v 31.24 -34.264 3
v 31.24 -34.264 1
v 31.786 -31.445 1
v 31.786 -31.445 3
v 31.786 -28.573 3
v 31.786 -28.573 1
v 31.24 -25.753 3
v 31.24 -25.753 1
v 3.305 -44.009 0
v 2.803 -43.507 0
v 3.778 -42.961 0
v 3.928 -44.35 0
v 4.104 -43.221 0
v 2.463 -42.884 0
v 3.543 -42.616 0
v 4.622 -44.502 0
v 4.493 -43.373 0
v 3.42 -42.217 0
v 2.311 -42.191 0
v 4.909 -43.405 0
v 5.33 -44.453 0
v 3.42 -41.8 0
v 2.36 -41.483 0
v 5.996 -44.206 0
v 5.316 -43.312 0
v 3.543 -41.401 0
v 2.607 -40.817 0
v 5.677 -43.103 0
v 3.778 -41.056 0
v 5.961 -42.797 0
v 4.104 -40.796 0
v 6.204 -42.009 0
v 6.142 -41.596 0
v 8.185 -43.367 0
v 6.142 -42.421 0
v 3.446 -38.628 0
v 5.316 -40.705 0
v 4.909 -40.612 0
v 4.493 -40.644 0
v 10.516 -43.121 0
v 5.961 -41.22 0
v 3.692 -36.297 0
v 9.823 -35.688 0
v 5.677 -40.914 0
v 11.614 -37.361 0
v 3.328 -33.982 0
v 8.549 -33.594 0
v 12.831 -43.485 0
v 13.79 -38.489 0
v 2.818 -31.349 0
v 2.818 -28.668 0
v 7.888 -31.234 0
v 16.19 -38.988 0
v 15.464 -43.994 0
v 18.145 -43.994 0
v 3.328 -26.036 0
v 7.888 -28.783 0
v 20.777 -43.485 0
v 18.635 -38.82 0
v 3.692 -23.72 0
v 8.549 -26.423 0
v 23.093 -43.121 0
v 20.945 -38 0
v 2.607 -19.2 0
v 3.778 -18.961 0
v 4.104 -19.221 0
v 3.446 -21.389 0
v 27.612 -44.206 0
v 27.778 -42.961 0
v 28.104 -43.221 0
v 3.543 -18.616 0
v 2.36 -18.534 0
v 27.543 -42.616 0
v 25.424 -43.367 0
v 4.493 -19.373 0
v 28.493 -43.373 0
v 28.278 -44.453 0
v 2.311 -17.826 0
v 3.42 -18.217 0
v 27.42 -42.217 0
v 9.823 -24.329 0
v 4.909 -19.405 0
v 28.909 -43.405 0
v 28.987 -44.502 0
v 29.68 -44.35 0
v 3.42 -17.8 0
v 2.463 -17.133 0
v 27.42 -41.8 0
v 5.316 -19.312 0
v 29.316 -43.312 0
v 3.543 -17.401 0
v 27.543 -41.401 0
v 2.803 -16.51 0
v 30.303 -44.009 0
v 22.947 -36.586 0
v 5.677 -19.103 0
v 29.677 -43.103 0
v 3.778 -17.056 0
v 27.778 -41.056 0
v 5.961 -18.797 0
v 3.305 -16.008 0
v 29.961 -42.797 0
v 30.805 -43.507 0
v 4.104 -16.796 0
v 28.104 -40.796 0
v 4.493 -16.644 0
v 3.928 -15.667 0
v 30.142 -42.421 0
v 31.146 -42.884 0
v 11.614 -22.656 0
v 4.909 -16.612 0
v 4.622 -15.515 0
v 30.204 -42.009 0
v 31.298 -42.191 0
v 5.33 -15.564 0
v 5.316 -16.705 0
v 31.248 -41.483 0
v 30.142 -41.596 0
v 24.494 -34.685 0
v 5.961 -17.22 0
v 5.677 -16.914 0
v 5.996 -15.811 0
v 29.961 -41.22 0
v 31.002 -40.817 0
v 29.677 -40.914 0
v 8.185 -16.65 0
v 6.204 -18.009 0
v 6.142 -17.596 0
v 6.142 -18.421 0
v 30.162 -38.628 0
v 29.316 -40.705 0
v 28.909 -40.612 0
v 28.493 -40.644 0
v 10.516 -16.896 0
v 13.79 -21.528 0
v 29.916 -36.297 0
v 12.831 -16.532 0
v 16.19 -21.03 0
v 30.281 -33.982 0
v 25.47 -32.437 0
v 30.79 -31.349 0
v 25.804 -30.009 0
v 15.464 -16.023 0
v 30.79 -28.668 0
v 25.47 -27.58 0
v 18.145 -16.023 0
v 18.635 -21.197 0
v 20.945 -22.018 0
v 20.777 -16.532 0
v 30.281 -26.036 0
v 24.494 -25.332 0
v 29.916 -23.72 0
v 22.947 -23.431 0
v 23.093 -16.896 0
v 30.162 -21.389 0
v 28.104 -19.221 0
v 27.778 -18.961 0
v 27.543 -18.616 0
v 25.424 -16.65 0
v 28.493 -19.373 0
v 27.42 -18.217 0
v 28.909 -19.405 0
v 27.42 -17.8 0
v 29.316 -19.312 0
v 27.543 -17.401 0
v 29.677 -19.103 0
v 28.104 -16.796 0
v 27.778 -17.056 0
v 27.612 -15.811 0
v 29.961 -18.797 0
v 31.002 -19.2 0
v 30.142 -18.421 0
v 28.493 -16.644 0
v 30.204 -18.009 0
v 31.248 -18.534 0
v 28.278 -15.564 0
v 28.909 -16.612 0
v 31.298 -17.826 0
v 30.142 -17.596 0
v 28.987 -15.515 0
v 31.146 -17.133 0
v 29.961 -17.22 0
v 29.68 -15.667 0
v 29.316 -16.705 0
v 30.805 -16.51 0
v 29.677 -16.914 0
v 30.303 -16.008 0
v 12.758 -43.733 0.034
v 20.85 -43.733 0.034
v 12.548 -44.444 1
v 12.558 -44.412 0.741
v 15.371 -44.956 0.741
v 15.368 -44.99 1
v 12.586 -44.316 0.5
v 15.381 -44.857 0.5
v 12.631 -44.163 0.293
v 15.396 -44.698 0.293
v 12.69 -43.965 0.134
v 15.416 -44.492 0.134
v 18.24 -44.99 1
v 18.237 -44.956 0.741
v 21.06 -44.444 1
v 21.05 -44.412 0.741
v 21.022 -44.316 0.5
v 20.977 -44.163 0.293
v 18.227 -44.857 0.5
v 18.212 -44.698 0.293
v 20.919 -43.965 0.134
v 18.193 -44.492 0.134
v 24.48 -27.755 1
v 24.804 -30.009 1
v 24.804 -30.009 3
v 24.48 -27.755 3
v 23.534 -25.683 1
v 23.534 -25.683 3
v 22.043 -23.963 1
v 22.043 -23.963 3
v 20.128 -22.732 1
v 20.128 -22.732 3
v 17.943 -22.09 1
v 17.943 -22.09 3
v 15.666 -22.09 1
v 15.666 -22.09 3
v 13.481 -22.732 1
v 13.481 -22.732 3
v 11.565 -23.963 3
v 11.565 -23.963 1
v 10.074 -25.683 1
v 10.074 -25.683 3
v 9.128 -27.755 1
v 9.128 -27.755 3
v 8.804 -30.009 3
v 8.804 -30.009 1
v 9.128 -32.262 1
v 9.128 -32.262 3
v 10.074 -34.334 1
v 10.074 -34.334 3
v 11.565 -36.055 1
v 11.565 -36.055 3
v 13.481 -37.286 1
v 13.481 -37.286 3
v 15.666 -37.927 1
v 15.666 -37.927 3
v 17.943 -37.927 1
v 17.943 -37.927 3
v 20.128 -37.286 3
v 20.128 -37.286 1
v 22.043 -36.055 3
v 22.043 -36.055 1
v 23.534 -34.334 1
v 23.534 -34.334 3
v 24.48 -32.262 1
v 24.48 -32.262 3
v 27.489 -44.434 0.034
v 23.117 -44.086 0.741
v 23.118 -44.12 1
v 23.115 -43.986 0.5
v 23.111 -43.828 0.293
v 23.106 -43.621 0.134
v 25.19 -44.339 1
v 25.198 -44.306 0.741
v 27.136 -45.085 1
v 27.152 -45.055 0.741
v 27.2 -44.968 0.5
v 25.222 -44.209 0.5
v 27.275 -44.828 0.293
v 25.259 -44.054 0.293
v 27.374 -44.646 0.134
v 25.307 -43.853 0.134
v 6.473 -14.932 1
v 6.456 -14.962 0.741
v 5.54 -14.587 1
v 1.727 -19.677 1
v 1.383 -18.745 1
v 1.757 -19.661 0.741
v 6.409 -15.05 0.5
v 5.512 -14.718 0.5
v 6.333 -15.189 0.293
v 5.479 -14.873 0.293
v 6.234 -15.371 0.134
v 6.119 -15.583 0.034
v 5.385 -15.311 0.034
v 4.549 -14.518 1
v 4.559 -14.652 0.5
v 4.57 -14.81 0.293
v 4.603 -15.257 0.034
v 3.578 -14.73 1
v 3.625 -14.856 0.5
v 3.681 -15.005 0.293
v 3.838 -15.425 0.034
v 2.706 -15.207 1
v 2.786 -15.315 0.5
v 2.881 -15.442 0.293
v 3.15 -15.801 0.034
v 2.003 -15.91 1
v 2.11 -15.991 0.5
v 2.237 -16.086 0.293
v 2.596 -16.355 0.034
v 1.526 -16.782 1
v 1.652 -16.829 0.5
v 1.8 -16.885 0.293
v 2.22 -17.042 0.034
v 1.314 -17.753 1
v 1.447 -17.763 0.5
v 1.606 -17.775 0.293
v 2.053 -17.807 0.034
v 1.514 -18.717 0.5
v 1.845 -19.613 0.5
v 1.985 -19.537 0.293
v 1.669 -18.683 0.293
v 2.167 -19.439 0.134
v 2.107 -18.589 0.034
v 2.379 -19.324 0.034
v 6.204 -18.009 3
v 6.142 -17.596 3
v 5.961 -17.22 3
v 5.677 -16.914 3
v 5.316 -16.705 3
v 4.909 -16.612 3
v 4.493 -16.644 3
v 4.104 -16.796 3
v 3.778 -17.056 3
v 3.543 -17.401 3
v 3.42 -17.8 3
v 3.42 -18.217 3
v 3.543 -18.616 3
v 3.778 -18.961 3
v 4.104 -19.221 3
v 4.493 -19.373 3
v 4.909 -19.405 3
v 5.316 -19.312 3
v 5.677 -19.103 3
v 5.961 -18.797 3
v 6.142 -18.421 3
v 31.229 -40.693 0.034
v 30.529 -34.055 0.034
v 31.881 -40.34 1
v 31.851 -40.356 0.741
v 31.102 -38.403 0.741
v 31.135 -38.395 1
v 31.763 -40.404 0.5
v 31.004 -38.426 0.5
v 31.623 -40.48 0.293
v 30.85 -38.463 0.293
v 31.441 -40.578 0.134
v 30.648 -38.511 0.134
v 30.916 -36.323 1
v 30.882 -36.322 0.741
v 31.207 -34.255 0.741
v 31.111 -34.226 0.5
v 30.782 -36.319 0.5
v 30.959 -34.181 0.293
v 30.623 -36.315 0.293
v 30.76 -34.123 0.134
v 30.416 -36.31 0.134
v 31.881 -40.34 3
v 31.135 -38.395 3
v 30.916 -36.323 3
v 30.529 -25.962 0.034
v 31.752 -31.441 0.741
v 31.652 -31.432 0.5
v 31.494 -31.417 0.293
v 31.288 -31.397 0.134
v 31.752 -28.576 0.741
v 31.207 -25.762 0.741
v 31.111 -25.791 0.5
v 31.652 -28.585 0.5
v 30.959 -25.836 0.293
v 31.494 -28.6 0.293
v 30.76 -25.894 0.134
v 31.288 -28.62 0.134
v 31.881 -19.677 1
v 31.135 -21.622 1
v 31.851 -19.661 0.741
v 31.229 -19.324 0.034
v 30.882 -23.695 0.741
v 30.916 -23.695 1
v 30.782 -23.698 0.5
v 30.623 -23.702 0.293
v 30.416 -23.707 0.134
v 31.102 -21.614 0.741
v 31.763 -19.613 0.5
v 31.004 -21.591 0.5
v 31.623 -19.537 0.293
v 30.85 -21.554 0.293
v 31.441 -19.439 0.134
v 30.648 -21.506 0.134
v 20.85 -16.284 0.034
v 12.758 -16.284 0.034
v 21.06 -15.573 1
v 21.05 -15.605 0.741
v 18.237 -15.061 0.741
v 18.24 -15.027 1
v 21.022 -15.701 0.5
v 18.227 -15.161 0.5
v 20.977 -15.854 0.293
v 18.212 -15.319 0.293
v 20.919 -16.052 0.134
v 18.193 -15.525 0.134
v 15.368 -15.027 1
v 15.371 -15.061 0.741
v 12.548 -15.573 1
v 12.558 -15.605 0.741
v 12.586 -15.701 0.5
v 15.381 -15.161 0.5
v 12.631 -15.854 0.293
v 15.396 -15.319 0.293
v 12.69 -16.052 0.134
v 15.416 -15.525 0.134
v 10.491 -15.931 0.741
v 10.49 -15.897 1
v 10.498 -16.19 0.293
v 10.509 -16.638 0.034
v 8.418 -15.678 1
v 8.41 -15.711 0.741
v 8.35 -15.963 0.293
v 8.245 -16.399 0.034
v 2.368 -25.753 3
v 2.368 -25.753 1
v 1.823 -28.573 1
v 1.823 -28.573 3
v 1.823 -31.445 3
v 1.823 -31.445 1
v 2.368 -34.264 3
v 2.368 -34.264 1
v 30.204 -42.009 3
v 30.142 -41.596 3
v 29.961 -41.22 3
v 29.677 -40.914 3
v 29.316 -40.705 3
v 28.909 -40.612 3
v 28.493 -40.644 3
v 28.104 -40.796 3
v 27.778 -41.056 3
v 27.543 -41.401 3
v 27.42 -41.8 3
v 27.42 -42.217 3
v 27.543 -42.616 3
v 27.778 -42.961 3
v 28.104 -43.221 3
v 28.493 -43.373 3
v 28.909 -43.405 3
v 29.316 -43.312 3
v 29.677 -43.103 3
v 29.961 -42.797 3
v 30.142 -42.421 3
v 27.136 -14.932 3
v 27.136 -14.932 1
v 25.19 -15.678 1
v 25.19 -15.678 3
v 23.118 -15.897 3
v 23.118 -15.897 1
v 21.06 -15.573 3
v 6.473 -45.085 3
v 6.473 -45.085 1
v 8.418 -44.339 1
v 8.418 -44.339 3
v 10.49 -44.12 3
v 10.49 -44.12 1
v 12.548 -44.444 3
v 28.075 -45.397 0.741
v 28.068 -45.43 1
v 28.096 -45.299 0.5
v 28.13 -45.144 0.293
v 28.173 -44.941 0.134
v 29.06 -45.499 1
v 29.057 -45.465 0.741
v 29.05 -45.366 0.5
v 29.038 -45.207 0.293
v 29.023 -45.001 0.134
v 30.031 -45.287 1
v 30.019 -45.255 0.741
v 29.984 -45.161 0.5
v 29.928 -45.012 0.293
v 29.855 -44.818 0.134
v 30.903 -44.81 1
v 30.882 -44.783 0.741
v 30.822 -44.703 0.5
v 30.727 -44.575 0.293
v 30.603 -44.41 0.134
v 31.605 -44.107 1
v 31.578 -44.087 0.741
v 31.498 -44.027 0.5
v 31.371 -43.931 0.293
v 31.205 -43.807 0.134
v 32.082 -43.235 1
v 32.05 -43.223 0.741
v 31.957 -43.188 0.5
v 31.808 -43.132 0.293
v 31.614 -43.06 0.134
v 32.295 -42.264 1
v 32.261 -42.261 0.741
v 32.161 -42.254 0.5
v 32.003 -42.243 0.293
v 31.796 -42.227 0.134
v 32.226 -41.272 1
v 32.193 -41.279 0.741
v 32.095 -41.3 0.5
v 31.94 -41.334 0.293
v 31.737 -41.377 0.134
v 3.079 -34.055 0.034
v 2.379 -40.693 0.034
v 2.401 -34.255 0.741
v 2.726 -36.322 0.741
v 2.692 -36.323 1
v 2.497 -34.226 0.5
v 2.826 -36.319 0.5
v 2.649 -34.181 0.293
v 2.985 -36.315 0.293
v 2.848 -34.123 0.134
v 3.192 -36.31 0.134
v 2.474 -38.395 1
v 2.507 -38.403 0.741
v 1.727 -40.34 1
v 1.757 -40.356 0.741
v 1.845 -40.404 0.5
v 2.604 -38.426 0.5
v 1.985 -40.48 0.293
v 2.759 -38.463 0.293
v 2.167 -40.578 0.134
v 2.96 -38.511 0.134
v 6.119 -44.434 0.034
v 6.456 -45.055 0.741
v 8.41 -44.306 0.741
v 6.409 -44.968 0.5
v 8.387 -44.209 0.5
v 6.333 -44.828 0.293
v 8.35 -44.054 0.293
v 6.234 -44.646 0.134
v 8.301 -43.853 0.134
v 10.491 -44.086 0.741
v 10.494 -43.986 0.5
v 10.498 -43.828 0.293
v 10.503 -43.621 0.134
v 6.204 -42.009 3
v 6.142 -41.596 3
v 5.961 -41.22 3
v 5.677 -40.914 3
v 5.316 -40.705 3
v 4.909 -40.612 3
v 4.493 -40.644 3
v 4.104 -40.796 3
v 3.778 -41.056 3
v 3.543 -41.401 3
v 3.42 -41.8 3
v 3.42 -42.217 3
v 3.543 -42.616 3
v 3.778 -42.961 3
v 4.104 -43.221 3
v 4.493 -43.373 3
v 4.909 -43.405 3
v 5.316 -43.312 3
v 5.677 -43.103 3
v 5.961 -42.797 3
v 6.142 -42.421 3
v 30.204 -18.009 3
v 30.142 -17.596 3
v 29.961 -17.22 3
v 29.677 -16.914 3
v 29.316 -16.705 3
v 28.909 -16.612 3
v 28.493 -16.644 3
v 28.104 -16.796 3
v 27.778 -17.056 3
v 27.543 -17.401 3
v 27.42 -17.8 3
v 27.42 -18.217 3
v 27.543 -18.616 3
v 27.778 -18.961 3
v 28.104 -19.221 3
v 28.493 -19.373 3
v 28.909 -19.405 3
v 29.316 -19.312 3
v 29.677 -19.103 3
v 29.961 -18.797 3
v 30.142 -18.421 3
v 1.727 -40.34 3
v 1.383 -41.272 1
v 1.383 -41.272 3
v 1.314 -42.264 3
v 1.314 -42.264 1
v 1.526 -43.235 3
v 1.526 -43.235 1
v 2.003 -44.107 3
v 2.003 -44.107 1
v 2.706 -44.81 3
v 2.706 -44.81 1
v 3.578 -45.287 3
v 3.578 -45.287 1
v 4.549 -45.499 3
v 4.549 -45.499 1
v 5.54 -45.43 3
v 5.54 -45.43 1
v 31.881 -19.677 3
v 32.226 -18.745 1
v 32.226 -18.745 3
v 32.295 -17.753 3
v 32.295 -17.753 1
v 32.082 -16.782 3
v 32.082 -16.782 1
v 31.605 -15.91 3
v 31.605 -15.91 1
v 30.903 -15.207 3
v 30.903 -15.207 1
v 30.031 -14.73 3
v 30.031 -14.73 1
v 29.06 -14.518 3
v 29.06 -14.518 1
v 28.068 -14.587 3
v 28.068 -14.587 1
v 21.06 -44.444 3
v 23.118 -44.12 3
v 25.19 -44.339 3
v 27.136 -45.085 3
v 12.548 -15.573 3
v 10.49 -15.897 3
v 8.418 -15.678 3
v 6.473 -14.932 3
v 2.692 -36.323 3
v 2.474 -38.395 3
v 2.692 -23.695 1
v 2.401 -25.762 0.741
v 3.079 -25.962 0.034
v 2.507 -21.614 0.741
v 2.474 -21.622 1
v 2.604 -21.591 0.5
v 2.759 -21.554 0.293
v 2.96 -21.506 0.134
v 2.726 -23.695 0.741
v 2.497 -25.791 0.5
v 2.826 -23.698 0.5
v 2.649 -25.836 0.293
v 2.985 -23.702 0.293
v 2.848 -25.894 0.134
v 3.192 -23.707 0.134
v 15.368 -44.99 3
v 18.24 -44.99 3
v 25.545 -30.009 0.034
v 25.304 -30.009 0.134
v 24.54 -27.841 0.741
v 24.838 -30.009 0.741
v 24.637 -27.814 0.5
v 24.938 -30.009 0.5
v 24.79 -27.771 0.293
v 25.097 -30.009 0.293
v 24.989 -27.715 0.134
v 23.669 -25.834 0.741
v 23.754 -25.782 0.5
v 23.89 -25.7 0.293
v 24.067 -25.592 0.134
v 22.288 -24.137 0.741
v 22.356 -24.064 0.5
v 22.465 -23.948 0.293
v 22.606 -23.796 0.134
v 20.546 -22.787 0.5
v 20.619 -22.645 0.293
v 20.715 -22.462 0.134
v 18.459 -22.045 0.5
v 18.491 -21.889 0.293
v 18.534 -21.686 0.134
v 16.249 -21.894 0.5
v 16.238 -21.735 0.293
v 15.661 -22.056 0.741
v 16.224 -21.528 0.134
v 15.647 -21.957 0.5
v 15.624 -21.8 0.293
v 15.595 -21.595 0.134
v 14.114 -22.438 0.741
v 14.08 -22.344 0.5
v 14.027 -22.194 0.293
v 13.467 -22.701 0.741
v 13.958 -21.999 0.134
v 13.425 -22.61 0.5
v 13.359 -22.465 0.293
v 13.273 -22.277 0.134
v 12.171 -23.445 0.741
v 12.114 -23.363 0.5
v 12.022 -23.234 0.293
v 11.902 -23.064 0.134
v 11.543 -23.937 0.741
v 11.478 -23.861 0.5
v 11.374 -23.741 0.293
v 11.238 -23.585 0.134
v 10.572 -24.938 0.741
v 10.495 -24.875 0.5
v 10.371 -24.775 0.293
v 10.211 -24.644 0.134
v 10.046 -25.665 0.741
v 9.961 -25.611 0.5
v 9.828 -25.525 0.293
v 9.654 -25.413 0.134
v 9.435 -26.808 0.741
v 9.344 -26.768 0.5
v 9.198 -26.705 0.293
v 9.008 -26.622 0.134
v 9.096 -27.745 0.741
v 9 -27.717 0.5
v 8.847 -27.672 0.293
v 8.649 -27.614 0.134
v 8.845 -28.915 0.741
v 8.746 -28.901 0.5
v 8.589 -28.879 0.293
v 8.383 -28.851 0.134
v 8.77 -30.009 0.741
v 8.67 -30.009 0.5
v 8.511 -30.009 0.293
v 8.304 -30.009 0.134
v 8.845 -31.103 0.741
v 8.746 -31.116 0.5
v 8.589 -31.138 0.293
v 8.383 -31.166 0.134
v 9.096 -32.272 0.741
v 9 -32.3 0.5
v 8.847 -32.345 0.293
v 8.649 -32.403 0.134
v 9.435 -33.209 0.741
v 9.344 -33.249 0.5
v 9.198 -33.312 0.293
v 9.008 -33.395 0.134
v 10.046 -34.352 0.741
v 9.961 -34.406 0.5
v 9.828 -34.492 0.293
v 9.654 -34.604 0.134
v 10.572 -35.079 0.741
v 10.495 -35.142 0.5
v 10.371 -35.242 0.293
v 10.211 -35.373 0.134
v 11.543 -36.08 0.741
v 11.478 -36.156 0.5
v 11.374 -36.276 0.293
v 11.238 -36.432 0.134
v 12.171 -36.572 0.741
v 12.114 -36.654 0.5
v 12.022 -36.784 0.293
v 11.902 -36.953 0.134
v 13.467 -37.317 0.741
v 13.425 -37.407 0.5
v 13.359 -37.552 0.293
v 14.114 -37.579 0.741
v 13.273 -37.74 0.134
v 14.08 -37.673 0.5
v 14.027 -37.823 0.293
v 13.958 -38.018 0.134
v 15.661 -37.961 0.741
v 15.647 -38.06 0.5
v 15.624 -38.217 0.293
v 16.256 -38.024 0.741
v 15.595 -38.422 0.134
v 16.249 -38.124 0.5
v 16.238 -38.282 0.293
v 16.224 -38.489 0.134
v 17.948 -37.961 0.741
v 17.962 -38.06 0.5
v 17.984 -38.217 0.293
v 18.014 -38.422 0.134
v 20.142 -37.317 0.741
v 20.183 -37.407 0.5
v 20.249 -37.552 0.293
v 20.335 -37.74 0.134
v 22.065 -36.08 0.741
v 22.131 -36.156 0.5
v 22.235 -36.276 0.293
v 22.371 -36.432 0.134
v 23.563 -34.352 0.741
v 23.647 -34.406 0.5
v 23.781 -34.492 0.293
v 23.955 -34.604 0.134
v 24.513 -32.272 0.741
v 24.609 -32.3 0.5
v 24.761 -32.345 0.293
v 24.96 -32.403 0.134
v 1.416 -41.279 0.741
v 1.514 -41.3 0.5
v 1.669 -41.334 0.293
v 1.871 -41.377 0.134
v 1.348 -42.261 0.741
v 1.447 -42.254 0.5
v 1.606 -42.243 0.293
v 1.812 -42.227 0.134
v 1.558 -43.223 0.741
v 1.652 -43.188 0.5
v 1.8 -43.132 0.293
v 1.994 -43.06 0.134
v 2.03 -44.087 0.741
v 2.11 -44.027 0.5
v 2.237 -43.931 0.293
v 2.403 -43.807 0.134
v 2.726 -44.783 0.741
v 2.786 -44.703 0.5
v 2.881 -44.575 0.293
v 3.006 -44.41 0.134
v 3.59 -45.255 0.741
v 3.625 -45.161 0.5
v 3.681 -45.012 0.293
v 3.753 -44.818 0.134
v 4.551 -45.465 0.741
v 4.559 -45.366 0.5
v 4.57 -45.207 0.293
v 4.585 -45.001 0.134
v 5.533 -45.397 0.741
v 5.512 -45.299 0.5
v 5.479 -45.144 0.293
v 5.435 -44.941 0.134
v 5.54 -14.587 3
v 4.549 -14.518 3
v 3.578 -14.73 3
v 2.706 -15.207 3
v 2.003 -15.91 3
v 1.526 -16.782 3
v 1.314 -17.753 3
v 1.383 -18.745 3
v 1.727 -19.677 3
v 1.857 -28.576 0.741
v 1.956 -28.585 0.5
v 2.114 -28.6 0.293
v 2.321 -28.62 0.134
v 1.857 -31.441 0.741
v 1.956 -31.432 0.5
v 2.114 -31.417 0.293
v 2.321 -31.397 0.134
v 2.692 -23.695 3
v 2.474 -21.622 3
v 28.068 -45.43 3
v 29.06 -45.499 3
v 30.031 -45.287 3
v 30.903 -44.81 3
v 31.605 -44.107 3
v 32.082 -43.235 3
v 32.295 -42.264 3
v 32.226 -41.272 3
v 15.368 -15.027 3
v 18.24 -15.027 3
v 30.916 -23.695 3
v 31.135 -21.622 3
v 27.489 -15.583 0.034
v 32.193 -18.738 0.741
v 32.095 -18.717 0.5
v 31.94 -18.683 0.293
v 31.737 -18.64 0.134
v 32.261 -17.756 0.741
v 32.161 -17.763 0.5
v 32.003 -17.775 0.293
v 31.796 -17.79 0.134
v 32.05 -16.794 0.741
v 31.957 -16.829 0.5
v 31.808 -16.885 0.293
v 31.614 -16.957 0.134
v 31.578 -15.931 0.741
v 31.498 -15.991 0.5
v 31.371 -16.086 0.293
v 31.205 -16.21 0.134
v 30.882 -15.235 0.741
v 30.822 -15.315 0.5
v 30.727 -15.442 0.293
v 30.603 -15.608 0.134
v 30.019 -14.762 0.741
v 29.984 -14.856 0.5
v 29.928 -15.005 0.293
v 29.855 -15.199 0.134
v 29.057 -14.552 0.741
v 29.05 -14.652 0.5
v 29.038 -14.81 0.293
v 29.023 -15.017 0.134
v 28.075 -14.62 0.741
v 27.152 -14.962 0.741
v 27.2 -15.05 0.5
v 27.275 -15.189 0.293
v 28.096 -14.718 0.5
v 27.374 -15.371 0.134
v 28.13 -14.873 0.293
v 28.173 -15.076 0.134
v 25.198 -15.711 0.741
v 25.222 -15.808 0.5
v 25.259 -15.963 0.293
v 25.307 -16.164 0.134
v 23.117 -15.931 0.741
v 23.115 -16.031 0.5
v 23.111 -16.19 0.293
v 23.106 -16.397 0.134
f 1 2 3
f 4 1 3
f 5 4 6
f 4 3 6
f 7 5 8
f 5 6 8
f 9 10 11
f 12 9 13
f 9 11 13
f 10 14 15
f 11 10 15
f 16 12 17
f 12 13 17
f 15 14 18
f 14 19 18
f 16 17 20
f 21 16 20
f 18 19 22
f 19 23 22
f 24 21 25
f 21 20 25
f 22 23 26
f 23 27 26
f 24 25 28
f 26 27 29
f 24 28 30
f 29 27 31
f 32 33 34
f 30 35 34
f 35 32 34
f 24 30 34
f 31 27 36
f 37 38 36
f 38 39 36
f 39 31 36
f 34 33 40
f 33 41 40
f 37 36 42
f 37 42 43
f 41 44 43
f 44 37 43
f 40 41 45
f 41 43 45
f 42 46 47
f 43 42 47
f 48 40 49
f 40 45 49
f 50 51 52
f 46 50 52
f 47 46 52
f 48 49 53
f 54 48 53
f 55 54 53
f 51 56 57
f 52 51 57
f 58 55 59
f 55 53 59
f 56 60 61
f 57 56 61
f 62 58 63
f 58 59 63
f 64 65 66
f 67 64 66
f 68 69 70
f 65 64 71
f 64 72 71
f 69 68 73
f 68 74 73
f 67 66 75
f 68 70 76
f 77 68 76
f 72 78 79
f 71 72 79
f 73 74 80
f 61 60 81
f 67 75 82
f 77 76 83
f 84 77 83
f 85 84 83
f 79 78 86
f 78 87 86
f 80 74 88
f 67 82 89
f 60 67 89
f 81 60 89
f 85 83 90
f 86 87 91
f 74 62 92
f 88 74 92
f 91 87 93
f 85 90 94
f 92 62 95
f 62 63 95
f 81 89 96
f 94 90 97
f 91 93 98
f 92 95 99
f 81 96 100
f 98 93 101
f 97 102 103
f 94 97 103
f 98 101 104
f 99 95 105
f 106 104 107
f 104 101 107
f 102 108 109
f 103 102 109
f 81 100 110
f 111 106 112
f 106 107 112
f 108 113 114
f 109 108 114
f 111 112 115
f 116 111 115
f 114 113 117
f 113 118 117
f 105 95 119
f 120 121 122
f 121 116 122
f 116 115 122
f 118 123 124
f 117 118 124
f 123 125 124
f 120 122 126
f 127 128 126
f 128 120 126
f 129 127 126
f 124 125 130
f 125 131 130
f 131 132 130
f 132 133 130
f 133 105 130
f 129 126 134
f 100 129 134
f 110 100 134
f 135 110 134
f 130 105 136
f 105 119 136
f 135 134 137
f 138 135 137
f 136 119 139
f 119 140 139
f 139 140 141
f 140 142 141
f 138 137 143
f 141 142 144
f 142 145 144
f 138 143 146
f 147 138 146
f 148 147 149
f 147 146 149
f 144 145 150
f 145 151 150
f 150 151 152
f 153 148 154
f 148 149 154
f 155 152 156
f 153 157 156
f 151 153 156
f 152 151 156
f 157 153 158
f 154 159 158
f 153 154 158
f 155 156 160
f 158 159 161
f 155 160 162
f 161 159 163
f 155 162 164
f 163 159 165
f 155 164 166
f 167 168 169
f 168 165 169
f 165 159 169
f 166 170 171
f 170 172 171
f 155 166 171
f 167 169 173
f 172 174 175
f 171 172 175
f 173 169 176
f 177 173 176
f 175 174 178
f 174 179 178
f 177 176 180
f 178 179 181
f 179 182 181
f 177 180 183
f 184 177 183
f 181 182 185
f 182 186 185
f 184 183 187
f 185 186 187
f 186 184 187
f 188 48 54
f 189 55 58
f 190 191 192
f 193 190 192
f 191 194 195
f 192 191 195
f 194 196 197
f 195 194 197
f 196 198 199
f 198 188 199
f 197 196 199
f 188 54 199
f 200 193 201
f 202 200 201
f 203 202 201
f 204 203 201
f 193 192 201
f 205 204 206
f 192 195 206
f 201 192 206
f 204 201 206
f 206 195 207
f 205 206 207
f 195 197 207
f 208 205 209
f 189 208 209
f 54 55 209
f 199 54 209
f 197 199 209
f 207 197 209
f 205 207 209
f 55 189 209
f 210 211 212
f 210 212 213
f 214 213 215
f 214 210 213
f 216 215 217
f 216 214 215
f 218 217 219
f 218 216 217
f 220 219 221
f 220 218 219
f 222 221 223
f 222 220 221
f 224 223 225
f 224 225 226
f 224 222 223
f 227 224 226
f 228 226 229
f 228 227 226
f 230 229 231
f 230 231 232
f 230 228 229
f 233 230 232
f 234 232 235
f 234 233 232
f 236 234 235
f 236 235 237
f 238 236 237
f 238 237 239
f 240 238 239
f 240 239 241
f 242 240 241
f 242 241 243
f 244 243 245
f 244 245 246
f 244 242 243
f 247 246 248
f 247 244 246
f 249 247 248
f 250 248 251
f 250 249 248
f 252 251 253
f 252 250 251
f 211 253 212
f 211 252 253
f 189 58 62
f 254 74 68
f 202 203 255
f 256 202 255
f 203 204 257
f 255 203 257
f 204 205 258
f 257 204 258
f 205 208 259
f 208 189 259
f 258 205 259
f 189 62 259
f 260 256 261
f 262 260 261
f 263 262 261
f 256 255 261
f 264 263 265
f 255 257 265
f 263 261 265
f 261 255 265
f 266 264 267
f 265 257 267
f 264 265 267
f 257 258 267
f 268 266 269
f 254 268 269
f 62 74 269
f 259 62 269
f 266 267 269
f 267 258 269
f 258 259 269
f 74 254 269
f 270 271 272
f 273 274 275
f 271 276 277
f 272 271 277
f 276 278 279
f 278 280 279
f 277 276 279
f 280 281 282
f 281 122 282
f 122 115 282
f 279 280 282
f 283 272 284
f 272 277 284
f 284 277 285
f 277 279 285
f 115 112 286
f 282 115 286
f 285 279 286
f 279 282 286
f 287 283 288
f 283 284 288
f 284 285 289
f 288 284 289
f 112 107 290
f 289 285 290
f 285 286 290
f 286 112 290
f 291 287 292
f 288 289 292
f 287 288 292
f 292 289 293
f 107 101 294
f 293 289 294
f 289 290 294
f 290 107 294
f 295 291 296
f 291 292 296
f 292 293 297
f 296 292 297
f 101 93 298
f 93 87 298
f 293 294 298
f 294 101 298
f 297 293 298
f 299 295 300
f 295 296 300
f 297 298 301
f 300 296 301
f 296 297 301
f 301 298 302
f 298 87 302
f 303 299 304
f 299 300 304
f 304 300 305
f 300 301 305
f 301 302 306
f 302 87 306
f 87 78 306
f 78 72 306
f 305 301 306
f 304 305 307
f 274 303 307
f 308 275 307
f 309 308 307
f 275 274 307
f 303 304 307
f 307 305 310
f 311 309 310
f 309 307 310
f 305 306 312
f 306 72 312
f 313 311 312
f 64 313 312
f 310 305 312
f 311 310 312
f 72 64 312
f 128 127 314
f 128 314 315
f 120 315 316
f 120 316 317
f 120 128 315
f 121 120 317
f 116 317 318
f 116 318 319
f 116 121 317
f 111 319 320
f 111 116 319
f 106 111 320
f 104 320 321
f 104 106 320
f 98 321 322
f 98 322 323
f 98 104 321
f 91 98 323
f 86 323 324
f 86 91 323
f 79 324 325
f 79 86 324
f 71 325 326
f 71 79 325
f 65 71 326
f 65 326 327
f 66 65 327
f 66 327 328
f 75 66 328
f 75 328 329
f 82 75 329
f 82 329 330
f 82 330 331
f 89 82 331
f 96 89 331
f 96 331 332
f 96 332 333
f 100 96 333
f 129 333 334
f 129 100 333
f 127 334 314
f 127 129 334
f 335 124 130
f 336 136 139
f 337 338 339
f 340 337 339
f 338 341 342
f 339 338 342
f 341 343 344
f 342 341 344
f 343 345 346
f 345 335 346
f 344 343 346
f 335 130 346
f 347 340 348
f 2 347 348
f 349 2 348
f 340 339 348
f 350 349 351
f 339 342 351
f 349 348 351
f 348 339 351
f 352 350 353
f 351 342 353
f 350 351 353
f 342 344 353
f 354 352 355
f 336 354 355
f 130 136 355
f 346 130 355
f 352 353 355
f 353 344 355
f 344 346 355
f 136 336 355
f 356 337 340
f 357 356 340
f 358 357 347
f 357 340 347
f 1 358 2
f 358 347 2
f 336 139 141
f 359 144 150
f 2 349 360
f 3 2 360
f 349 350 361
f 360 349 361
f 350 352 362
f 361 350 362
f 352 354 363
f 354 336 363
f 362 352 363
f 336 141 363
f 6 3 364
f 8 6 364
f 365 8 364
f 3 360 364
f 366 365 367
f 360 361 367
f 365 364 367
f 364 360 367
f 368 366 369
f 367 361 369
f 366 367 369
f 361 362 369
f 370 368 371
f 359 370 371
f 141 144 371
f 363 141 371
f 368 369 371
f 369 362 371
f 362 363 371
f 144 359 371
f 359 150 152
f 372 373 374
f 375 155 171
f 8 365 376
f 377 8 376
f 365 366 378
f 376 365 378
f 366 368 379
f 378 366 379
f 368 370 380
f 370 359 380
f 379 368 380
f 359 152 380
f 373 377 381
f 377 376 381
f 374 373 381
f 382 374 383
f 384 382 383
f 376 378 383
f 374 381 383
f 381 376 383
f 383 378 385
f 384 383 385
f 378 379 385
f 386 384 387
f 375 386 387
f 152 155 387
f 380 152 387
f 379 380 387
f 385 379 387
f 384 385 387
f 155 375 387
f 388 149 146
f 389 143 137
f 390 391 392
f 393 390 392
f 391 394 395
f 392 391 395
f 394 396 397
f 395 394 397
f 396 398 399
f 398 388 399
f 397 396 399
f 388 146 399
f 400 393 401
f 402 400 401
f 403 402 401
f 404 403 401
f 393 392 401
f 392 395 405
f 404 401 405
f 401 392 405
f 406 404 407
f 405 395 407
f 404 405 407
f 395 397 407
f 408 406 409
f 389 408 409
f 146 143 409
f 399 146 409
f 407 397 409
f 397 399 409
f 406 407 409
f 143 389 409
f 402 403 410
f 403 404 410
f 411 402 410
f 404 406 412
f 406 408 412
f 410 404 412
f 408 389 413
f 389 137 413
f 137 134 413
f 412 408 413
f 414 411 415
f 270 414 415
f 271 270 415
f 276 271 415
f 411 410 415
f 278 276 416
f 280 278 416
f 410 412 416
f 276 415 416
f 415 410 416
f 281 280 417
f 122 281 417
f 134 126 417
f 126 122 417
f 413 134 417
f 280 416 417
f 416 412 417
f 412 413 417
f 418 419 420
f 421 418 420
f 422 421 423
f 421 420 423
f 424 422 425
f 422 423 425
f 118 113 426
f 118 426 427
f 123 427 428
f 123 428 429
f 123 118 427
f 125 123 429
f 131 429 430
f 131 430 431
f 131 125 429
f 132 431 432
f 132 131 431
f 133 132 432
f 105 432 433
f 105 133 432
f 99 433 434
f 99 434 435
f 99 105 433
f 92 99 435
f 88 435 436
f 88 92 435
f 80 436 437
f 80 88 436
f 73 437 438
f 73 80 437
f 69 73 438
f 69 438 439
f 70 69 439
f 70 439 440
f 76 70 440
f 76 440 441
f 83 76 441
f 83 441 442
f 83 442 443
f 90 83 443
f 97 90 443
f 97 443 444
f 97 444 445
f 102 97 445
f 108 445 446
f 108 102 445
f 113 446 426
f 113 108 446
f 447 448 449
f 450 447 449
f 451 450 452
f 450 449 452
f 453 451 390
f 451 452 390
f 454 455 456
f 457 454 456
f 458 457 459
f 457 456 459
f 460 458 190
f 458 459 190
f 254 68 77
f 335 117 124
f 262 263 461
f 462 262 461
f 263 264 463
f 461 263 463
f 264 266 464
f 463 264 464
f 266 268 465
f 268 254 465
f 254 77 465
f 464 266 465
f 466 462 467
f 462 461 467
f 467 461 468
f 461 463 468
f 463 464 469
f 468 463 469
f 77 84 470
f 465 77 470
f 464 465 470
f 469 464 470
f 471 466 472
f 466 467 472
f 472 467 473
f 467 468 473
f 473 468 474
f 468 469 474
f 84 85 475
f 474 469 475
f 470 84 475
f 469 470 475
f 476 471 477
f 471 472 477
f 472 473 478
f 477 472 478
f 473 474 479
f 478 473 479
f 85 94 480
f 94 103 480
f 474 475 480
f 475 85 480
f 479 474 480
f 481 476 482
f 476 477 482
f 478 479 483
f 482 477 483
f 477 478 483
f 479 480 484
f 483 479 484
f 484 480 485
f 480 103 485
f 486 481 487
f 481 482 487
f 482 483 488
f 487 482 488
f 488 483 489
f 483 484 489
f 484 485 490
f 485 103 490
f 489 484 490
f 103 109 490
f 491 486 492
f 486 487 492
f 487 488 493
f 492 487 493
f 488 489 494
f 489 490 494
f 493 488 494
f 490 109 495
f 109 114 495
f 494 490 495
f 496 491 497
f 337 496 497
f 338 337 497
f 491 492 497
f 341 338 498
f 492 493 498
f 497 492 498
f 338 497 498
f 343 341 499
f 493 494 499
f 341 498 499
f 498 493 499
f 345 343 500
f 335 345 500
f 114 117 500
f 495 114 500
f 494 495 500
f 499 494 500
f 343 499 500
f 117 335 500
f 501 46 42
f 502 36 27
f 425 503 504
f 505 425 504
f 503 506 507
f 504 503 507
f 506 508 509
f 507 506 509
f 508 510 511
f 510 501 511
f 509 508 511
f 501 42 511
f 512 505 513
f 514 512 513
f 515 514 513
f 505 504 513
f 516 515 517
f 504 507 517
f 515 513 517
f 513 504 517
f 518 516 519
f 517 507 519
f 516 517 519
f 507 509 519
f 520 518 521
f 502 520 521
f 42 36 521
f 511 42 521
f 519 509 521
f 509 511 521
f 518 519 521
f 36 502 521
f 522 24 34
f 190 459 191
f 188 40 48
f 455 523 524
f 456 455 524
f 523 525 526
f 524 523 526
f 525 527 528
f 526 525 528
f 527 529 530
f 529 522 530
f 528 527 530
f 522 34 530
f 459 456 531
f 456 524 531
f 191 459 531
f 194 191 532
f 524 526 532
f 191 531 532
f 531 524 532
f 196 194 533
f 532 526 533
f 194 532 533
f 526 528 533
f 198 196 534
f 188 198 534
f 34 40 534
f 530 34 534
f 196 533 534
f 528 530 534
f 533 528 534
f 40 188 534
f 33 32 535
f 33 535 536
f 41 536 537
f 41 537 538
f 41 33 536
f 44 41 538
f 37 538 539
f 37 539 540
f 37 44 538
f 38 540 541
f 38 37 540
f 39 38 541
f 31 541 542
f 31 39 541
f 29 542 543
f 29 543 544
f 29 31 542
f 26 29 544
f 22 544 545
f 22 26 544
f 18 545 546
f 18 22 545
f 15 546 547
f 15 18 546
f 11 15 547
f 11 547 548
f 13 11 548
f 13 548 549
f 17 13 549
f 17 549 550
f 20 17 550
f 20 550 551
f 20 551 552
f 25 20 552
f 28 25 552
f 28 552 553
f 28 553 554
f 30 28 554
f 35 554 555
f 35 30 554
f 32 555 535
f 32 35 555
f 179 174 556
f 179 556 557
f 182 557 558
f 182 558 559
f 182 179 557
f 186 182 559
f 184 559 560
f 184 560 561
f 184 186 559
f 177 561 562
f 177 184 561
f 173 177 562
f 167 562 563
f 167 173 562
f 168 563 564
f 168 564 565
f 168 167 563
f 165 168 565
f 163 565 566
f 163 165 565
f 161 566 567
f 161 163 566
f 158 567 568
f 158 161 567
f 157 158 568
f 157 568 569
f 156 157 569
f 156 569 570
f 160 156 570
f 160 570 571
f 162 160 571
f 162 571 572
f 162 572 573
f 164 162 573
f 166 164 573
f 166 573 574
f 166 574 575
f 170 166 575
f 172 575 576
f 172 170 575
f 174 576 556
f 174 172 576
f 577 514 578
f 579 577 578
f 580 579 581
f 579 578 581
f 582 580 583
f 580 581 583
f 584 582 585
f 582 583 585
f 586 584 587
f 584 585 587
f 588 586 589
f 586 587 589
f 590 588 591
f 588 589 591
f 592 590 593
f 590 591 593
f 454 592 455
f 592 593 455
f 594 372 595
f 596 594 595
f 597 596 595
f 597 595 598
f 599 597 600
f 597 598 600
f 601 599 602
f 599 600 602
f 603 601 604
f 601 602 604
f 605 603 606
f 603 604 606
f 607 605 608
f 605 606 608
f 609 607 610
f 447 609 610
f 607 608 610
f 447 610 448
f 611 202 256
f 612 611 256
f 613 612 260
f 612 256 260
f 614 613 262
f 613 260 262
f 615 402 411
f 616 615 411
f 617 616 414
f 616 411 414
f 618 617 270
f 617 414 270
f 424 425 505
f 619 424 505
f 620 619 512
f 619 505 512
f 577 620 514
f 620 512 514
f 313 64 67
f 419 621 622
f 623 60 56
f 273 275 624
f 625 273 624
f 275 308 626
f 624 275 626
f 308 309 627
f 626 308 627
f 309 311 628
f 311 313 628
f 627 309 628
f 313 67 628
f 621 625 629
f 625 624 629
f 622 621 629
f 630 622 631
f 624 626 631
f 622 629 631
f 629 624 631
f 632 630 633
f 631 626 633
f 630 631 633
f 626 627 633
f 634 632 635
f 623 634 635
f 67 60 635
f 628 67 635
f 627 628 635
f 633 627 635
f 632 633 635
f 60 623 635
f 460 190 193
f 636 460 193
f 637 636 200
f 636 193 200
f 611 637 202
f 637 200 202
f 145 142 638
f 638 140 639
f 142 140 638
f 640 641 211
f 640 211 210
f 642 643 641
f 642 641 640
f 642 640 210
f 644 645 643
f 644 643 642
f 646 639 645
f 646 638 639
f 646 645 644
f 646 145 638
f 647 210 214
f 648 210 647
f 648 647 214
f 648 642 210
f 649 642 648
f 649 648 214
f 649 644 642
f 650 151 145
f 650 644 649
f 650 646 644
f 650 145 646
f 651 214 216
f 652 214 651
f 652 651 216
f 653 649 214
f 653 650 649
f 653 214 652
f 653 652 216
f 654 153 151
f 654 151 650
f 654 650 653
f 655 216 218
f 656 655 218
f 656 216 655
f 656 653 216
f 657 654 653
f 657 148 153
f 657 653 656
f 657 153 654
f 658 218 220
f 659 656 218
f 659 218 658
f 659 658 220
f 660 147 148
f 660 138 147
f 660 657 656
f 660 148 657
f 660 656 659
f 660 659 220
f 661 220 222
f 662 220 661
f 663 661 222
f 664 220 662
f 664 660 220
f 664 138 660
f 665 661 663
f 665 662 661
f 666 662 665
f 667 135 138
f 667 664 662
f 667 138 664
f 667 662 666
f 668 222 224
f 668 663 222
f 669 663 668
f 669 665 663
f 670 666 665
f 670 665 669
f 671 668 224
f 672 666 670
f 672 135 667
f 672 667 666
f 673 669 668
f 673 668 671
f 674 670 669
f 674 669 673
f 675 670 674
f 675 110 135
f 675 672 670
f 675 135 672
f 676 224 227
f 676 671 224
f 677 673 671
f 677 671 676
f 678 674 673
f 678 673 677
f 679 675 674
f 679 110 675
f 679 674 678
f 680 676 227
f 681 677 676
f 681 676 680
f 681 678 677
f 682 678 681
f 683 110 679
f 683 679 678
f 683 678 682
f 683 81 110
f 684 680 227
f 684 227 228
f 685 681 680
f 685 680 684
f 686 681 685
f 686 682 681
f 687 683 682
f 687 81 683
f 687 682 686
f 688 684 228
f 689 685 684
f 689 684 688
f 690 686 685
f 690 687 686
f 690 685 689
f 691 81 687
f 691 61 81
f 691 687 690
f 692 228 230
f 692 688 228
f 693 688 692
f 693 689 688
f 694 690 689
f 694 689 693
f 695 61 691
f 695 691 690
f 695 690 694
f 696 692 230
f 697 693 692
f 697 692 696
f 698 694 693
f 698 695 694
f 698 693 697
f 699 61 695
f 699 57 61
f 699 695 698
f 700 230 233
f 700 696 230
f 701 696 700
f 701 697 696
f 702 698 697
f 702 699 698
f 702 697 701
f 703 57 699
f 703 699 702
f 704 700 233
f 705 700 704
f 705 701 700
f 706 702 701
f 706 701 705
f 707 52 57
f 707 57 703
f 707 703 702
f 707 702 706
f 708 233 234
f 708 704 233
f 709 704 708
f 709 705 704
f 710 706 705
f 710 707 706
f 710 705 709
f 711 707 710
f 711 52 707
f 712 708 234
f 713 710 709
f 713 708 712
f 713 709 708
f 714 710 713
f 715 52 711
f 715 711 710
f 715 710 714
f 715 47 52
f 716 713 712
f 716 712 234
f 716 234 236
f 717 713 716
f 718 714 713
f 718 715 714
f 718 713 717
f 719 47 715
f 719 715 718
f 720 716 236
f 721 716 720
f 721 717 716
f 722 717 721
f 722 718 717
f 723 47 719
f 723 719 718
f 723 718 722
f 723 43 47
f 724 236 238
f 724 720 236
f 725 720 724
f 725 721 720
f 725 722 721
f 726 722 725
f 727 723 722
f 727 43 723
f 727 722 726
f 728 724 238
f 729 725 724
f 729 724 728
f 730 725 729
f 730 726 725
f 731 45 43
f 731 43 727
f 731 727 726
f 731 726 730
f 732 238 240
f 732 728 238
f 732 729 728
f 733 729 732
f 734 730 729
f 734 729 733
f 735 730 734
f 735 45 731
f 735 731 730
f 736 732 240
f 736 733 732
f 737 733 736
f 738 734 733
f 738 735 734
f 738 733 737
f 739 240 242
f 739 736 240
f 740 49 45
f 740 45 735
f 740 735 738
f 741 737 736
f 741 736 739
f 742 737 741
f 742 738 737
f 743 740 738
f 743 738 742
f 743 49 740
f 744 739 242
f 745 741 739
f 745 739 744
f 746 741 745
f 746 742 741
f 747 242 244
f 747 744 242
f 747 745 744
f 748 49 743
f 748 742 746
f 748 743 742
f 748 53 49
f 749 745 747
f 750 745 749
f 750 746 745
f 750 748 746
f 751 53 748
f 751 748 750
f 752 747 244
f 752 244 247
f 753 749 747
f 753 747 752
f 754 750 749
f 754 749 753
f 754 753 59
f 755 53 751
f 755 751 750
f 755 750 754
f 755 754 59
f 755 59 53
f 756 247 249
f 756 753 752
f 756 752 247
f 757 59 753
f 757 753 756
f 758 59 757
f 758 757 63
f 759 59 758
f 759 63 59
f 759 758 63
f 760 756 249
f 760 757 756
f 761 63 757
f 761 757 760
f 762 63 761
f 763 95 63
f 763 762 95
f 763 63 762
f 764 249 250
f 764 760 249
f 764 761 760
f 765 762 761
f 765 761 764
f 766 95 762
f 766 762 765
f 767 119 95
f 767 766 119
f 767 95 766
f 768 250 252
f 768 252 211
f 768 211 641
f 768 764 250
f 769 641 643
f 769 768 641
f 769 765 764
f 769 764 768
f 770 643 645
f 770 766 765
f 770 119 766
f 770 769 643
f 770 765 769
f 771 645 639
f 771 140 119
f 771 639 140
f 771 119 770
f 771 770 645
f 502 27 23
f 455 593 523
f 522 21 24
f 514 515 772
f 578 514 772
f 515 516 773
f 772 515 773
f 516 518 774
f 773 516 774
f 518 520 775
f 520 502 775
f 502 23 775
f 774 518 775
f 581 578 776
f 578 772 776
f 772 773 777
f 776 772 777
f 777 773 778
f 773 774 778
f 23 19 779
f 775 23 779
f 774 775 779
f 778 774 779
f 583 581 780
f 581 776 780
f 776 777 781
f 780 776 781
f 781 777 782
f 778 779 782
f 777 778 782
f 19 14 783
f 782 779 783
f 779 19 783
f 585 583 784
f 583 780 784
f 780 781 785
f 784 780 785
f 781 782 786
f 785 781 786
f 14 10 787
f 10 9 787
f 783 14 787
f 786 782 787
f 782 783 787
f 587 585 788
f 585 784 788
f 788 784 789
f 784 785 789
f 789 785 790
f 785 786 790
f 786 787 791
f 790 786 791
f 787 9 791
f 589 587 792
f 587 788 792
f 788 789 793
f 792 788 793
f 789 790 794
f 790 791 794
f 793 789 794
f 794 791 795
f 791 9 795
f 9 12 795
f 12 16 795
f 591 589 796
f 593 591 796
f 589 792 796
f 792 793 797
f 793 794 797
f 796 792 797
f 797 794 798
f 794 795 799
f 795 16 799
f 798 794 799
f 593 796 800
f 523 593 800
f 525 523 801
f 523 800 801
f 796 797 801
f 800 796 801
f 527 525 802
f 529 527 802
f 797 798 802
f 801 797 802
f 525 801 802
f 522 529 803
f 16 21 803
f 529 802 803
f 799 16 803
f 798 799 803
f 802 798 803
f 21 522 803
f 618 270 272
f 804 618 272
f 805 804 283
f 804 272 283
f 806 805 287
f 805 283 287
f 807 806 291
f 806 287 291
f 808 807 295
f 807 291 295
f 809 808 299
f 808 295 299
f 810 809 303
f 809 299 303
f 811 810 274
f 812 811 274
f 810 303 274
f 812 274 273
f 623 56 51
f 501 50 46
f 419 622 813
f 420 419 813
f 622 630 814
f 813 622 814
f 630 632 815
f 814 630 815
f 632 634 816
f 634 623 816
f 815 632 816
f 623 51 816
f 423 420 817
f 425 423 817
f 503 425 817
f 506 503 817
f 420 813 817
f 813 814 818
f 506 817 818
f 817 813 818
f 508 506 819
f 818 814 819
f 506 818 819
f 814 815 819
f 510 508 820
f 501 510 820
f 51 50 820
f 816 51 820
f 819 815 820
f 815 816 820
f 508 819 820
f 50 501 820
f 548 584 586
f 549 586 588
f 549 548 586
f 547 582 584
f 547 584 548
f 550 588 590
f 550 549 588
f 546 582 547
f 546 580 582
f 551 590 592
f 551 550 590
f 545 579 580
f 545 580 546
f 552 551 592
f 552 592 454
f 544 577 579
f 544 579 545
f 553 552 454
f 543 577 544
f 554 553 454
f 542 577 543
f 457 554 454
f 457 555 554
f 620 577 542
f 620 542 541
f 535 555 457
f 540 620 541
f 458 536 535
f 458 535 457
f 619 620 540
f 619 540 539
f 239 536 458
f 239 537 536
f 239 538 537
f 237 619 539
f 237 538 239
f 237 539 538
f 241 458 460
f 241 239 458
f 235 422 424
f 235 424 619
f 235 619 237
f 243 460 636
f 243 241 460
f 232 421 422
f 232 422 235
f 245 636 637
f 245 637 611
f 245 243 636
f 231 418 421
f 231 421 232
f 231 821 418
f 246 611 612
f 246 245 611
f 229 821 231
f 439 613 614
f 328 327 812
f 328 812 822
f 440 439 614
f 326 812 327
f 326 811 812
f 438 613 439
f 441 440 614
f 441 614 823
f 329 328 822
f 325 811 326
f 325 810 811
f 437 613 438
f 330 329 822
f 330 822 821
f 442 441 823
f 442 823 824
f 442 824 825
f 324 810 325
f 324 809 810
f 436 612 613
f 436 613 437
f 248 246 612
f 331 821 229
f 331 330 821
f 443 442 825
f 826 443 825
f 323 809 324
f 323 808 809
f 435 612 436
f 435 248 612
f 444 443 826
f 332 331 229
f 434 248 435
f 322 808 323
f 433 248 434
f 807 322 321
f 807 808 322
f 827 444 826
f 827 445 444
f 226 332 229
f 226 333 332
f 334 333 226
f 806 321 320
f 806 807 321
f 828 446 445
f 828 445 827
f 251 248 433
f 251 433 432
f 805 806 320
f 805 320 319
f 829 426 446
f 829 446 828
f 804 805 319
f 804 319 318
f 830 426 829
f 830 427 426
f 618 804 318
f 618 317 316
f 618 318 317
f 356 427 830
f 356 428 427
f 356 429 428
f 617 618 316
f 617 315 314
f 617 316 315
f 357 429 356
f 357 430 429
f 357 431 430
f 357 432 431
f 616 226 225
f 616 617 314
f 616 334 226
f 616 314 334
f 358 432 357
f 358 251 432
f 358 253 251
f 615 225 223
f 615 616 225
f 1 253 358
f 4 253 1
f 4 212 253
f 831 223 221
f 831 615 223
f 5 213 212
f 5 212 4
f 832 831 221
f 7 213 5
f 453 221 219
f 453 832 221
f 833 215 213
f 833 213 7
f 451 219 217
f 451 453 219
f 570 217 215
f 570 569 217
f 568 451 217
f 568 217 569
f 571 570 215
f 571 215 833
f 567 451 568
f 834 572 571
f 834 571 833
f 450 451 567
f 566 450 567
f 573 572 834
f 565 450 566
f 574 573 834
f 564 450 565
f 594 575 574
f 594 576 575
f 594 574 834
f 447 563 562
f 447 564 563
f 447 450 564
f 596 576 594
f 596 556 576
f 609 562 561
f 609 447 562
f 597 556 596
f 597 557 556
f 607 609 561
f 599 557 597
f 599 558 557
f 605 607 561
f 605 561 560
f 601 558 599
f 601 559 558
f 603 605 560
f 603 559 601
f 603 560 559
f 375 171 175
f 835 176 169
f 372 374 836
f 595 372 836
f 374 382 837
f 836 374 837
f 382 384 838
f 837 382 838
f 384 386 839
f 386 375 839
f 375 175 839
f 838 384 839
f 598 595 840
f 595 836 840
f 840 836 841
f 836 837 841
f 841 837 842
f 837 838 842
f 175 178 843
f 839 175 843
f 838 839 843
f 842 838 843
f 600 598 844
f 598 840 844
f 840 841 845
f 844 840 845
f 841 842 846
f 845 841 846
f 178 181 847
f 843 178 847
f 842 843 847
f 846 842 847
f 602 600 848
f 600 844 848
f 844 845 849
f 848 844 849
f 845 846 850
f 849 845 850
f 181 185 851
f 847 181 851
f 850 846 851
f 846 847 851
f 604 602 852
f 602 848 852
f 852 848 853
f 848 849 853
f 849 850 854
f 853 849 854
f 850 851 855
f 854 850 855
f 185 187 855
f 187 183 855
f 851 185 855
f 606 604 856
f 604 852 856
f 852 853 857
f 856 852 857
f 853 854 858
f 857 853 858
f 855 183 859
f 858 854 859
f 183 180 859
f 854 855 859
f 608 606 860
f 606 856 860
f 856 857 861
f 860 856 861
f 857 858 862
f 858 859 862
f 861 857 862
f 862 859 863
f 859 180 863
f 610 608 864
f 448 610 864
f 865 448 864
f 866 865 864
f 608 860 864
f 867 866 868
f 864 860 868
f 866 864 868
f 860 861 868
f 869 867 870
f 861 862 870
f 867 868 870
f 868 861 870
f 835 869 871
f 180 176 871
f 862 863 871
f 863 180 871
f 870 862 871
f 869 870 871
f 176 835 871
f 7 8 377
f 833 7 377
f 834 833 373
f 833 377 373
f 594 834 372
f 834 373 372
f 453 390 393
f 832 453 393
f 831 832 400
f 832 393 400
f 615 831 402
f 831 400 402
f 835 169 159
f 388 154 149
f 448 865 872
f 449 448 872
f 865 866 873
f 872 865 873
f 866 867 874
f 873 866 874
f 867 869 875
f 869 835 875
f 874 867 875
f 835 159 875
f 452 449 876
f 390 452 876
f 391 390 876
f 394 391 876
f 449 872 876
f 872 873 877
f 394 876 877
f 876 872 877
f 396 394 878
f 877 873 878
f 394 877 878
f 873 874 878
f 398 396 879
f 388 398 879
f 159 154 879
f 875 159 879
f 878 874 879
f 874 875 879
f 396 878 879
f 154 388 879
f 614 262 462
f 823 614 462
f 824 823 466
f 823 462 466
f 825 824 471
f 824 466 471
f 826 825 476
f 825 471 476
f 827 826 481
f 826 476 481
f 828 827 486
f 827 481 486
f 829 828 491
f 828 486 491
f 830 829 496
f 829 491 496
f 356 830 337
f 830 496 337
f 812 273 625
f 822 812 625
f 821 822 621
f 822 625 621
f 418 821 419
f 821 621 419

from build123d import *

# Parameters (mm, degrees)
SKETCH2_R           = 8
SKETCH2_R_2         = 1.4
BOSS_EXTRUDE1_DEPTH = 3
FILLET1_R           = 1


with BuildPart() as part:
    # Sketch2 → Boss-Extrude1 (new body)
    with BuildSketch(Plane.XY):
        with BuildLine():
            ThreePointArc((2.368452446, -25.752812678), (1.754211193, -30.008558133), (2.368452446, -34.264303588))
            ThreePointArc((2.368452446, -34.264303588), (2.650810328, -37.36580095), (1.727482394, -40.34010379))
            ThreePointArc((1.727482394, -40.34010379), (2.329337459, -44.483431868), (6.472665536, -45.085286933))
            ThreePointArc((6.472665536, -45.085286933), (9.446968377, -44.161958999), (12.548465738, -44.444316881))
            ThreePointArc((12.548465738, -44.444316881), (16.804211193, -45.058558133), (21.059956649, -44.444316881))
            ThreePointArc((21.059956649, -44.444316881), (24.16145401, -44.161958999), (27.135756851, -45.085286933))
            ThreePointArc((27.135756851, -45.085286933), (31.279084928, -44.483431868), (31.880939993, -40.34010379))
            ThreePointArc((31.880939993, -40.34010379), (30.957612059, -37.36580095), (31.239969941, -34.264303588))
            ThreePointArc((31.239969941, -34.264303588), (31.854211193, -30.008558133), (31.239969941, -25.752812678))
            ThreePointArc((31.239969941, -25.752812678), (30.957612059, -22.651315316), (31.880939993, -19.677012476))
            ThreePointArc((31.880939993, -19.677012476), (31.279084928, -15.533684399), (27.135756851, -14.931829334))
            ThreePointArc((27.135756851, -14.931829334), (24.16145401, -15.855157268), (21.059956649, -15.572799386))
            ThreePointArc((21.059956649, -15.572799386), (16.804211193, -14.958558133), (12.548465738, -15.572799386))
            ThreePointArc((12.548465738, -15.572799386), (9.446968377, -15.855157268), (6.472665536, -14.931829334))
            ThreePointArc((6.472665536, -14.931829334), (2.329337459, -15.533684399), (1.727482394, -19.677012476))
            ThreePointArc((1.727482394, -19.677012476), (2.650810328, -22.651315316), (2.368452446, -25.752812678))
        make_face()
        with Locations((16.804211193, -30.008558133)):
            Circle(SKETCH2_R, mode=Mode.SUBTRACT)
        with Locations((4.804211193, -18.008558133)):
            Circle(SKETCH2_R_2, mode=Mode.SUBTRACT)
        with Locations((28.804211193, -18.008558133)):
            Circle(SKETCH2_R_2, mode=Mode.SUBTRACT)
        with Locations((28.804211193, -42.008558133)):
            Circle(SKETCH2_R_2, mode=Mode.SUBTRACT)
        with Locations((4.804211193, -42.008558133)):
            Circle(SKETCH2_R_2, mode=Mode.SUBTRACT)
    extrude(amount=BOSS_EXTRUDE1_DEPTH)

    # Fillet1
    fillet1_edges = [part.edges().sort_by_distance(p)[0] for p in [
        (2.329337459, -15.533684399, 0),
        (9.446968377, -15.855157268, 0),
        (16.804211193, -14.958558133, 0),
        (24.16145401, -15.855157268, 0),
        (31.279084928, -15.533684399, 0),
        (30.957612059, -22.651315316, 0),
        (31.854211193, -30.008558133, 0),
        (30.957612059, -37.36580095, 0),
        (31.279084928, -44.483431868, 0),
        (24.16145401, -44.161958999, 0),
        (16.804211193, -45.058558133, 0),
        (9.446968377, -44.161958999, 0),
        (2.329337459, -44.483431868, 0),
        (2.650810328, -37.36580095, 0),
        (1.754211193, -30.008558133, 0),
        (2.650810328, -22.651315316, 0),
        (8.804211193, -30.008558133, 0),
    ]]
    fillet(fillet1_edges, radius=FILLET1_R)


solid = part.part
